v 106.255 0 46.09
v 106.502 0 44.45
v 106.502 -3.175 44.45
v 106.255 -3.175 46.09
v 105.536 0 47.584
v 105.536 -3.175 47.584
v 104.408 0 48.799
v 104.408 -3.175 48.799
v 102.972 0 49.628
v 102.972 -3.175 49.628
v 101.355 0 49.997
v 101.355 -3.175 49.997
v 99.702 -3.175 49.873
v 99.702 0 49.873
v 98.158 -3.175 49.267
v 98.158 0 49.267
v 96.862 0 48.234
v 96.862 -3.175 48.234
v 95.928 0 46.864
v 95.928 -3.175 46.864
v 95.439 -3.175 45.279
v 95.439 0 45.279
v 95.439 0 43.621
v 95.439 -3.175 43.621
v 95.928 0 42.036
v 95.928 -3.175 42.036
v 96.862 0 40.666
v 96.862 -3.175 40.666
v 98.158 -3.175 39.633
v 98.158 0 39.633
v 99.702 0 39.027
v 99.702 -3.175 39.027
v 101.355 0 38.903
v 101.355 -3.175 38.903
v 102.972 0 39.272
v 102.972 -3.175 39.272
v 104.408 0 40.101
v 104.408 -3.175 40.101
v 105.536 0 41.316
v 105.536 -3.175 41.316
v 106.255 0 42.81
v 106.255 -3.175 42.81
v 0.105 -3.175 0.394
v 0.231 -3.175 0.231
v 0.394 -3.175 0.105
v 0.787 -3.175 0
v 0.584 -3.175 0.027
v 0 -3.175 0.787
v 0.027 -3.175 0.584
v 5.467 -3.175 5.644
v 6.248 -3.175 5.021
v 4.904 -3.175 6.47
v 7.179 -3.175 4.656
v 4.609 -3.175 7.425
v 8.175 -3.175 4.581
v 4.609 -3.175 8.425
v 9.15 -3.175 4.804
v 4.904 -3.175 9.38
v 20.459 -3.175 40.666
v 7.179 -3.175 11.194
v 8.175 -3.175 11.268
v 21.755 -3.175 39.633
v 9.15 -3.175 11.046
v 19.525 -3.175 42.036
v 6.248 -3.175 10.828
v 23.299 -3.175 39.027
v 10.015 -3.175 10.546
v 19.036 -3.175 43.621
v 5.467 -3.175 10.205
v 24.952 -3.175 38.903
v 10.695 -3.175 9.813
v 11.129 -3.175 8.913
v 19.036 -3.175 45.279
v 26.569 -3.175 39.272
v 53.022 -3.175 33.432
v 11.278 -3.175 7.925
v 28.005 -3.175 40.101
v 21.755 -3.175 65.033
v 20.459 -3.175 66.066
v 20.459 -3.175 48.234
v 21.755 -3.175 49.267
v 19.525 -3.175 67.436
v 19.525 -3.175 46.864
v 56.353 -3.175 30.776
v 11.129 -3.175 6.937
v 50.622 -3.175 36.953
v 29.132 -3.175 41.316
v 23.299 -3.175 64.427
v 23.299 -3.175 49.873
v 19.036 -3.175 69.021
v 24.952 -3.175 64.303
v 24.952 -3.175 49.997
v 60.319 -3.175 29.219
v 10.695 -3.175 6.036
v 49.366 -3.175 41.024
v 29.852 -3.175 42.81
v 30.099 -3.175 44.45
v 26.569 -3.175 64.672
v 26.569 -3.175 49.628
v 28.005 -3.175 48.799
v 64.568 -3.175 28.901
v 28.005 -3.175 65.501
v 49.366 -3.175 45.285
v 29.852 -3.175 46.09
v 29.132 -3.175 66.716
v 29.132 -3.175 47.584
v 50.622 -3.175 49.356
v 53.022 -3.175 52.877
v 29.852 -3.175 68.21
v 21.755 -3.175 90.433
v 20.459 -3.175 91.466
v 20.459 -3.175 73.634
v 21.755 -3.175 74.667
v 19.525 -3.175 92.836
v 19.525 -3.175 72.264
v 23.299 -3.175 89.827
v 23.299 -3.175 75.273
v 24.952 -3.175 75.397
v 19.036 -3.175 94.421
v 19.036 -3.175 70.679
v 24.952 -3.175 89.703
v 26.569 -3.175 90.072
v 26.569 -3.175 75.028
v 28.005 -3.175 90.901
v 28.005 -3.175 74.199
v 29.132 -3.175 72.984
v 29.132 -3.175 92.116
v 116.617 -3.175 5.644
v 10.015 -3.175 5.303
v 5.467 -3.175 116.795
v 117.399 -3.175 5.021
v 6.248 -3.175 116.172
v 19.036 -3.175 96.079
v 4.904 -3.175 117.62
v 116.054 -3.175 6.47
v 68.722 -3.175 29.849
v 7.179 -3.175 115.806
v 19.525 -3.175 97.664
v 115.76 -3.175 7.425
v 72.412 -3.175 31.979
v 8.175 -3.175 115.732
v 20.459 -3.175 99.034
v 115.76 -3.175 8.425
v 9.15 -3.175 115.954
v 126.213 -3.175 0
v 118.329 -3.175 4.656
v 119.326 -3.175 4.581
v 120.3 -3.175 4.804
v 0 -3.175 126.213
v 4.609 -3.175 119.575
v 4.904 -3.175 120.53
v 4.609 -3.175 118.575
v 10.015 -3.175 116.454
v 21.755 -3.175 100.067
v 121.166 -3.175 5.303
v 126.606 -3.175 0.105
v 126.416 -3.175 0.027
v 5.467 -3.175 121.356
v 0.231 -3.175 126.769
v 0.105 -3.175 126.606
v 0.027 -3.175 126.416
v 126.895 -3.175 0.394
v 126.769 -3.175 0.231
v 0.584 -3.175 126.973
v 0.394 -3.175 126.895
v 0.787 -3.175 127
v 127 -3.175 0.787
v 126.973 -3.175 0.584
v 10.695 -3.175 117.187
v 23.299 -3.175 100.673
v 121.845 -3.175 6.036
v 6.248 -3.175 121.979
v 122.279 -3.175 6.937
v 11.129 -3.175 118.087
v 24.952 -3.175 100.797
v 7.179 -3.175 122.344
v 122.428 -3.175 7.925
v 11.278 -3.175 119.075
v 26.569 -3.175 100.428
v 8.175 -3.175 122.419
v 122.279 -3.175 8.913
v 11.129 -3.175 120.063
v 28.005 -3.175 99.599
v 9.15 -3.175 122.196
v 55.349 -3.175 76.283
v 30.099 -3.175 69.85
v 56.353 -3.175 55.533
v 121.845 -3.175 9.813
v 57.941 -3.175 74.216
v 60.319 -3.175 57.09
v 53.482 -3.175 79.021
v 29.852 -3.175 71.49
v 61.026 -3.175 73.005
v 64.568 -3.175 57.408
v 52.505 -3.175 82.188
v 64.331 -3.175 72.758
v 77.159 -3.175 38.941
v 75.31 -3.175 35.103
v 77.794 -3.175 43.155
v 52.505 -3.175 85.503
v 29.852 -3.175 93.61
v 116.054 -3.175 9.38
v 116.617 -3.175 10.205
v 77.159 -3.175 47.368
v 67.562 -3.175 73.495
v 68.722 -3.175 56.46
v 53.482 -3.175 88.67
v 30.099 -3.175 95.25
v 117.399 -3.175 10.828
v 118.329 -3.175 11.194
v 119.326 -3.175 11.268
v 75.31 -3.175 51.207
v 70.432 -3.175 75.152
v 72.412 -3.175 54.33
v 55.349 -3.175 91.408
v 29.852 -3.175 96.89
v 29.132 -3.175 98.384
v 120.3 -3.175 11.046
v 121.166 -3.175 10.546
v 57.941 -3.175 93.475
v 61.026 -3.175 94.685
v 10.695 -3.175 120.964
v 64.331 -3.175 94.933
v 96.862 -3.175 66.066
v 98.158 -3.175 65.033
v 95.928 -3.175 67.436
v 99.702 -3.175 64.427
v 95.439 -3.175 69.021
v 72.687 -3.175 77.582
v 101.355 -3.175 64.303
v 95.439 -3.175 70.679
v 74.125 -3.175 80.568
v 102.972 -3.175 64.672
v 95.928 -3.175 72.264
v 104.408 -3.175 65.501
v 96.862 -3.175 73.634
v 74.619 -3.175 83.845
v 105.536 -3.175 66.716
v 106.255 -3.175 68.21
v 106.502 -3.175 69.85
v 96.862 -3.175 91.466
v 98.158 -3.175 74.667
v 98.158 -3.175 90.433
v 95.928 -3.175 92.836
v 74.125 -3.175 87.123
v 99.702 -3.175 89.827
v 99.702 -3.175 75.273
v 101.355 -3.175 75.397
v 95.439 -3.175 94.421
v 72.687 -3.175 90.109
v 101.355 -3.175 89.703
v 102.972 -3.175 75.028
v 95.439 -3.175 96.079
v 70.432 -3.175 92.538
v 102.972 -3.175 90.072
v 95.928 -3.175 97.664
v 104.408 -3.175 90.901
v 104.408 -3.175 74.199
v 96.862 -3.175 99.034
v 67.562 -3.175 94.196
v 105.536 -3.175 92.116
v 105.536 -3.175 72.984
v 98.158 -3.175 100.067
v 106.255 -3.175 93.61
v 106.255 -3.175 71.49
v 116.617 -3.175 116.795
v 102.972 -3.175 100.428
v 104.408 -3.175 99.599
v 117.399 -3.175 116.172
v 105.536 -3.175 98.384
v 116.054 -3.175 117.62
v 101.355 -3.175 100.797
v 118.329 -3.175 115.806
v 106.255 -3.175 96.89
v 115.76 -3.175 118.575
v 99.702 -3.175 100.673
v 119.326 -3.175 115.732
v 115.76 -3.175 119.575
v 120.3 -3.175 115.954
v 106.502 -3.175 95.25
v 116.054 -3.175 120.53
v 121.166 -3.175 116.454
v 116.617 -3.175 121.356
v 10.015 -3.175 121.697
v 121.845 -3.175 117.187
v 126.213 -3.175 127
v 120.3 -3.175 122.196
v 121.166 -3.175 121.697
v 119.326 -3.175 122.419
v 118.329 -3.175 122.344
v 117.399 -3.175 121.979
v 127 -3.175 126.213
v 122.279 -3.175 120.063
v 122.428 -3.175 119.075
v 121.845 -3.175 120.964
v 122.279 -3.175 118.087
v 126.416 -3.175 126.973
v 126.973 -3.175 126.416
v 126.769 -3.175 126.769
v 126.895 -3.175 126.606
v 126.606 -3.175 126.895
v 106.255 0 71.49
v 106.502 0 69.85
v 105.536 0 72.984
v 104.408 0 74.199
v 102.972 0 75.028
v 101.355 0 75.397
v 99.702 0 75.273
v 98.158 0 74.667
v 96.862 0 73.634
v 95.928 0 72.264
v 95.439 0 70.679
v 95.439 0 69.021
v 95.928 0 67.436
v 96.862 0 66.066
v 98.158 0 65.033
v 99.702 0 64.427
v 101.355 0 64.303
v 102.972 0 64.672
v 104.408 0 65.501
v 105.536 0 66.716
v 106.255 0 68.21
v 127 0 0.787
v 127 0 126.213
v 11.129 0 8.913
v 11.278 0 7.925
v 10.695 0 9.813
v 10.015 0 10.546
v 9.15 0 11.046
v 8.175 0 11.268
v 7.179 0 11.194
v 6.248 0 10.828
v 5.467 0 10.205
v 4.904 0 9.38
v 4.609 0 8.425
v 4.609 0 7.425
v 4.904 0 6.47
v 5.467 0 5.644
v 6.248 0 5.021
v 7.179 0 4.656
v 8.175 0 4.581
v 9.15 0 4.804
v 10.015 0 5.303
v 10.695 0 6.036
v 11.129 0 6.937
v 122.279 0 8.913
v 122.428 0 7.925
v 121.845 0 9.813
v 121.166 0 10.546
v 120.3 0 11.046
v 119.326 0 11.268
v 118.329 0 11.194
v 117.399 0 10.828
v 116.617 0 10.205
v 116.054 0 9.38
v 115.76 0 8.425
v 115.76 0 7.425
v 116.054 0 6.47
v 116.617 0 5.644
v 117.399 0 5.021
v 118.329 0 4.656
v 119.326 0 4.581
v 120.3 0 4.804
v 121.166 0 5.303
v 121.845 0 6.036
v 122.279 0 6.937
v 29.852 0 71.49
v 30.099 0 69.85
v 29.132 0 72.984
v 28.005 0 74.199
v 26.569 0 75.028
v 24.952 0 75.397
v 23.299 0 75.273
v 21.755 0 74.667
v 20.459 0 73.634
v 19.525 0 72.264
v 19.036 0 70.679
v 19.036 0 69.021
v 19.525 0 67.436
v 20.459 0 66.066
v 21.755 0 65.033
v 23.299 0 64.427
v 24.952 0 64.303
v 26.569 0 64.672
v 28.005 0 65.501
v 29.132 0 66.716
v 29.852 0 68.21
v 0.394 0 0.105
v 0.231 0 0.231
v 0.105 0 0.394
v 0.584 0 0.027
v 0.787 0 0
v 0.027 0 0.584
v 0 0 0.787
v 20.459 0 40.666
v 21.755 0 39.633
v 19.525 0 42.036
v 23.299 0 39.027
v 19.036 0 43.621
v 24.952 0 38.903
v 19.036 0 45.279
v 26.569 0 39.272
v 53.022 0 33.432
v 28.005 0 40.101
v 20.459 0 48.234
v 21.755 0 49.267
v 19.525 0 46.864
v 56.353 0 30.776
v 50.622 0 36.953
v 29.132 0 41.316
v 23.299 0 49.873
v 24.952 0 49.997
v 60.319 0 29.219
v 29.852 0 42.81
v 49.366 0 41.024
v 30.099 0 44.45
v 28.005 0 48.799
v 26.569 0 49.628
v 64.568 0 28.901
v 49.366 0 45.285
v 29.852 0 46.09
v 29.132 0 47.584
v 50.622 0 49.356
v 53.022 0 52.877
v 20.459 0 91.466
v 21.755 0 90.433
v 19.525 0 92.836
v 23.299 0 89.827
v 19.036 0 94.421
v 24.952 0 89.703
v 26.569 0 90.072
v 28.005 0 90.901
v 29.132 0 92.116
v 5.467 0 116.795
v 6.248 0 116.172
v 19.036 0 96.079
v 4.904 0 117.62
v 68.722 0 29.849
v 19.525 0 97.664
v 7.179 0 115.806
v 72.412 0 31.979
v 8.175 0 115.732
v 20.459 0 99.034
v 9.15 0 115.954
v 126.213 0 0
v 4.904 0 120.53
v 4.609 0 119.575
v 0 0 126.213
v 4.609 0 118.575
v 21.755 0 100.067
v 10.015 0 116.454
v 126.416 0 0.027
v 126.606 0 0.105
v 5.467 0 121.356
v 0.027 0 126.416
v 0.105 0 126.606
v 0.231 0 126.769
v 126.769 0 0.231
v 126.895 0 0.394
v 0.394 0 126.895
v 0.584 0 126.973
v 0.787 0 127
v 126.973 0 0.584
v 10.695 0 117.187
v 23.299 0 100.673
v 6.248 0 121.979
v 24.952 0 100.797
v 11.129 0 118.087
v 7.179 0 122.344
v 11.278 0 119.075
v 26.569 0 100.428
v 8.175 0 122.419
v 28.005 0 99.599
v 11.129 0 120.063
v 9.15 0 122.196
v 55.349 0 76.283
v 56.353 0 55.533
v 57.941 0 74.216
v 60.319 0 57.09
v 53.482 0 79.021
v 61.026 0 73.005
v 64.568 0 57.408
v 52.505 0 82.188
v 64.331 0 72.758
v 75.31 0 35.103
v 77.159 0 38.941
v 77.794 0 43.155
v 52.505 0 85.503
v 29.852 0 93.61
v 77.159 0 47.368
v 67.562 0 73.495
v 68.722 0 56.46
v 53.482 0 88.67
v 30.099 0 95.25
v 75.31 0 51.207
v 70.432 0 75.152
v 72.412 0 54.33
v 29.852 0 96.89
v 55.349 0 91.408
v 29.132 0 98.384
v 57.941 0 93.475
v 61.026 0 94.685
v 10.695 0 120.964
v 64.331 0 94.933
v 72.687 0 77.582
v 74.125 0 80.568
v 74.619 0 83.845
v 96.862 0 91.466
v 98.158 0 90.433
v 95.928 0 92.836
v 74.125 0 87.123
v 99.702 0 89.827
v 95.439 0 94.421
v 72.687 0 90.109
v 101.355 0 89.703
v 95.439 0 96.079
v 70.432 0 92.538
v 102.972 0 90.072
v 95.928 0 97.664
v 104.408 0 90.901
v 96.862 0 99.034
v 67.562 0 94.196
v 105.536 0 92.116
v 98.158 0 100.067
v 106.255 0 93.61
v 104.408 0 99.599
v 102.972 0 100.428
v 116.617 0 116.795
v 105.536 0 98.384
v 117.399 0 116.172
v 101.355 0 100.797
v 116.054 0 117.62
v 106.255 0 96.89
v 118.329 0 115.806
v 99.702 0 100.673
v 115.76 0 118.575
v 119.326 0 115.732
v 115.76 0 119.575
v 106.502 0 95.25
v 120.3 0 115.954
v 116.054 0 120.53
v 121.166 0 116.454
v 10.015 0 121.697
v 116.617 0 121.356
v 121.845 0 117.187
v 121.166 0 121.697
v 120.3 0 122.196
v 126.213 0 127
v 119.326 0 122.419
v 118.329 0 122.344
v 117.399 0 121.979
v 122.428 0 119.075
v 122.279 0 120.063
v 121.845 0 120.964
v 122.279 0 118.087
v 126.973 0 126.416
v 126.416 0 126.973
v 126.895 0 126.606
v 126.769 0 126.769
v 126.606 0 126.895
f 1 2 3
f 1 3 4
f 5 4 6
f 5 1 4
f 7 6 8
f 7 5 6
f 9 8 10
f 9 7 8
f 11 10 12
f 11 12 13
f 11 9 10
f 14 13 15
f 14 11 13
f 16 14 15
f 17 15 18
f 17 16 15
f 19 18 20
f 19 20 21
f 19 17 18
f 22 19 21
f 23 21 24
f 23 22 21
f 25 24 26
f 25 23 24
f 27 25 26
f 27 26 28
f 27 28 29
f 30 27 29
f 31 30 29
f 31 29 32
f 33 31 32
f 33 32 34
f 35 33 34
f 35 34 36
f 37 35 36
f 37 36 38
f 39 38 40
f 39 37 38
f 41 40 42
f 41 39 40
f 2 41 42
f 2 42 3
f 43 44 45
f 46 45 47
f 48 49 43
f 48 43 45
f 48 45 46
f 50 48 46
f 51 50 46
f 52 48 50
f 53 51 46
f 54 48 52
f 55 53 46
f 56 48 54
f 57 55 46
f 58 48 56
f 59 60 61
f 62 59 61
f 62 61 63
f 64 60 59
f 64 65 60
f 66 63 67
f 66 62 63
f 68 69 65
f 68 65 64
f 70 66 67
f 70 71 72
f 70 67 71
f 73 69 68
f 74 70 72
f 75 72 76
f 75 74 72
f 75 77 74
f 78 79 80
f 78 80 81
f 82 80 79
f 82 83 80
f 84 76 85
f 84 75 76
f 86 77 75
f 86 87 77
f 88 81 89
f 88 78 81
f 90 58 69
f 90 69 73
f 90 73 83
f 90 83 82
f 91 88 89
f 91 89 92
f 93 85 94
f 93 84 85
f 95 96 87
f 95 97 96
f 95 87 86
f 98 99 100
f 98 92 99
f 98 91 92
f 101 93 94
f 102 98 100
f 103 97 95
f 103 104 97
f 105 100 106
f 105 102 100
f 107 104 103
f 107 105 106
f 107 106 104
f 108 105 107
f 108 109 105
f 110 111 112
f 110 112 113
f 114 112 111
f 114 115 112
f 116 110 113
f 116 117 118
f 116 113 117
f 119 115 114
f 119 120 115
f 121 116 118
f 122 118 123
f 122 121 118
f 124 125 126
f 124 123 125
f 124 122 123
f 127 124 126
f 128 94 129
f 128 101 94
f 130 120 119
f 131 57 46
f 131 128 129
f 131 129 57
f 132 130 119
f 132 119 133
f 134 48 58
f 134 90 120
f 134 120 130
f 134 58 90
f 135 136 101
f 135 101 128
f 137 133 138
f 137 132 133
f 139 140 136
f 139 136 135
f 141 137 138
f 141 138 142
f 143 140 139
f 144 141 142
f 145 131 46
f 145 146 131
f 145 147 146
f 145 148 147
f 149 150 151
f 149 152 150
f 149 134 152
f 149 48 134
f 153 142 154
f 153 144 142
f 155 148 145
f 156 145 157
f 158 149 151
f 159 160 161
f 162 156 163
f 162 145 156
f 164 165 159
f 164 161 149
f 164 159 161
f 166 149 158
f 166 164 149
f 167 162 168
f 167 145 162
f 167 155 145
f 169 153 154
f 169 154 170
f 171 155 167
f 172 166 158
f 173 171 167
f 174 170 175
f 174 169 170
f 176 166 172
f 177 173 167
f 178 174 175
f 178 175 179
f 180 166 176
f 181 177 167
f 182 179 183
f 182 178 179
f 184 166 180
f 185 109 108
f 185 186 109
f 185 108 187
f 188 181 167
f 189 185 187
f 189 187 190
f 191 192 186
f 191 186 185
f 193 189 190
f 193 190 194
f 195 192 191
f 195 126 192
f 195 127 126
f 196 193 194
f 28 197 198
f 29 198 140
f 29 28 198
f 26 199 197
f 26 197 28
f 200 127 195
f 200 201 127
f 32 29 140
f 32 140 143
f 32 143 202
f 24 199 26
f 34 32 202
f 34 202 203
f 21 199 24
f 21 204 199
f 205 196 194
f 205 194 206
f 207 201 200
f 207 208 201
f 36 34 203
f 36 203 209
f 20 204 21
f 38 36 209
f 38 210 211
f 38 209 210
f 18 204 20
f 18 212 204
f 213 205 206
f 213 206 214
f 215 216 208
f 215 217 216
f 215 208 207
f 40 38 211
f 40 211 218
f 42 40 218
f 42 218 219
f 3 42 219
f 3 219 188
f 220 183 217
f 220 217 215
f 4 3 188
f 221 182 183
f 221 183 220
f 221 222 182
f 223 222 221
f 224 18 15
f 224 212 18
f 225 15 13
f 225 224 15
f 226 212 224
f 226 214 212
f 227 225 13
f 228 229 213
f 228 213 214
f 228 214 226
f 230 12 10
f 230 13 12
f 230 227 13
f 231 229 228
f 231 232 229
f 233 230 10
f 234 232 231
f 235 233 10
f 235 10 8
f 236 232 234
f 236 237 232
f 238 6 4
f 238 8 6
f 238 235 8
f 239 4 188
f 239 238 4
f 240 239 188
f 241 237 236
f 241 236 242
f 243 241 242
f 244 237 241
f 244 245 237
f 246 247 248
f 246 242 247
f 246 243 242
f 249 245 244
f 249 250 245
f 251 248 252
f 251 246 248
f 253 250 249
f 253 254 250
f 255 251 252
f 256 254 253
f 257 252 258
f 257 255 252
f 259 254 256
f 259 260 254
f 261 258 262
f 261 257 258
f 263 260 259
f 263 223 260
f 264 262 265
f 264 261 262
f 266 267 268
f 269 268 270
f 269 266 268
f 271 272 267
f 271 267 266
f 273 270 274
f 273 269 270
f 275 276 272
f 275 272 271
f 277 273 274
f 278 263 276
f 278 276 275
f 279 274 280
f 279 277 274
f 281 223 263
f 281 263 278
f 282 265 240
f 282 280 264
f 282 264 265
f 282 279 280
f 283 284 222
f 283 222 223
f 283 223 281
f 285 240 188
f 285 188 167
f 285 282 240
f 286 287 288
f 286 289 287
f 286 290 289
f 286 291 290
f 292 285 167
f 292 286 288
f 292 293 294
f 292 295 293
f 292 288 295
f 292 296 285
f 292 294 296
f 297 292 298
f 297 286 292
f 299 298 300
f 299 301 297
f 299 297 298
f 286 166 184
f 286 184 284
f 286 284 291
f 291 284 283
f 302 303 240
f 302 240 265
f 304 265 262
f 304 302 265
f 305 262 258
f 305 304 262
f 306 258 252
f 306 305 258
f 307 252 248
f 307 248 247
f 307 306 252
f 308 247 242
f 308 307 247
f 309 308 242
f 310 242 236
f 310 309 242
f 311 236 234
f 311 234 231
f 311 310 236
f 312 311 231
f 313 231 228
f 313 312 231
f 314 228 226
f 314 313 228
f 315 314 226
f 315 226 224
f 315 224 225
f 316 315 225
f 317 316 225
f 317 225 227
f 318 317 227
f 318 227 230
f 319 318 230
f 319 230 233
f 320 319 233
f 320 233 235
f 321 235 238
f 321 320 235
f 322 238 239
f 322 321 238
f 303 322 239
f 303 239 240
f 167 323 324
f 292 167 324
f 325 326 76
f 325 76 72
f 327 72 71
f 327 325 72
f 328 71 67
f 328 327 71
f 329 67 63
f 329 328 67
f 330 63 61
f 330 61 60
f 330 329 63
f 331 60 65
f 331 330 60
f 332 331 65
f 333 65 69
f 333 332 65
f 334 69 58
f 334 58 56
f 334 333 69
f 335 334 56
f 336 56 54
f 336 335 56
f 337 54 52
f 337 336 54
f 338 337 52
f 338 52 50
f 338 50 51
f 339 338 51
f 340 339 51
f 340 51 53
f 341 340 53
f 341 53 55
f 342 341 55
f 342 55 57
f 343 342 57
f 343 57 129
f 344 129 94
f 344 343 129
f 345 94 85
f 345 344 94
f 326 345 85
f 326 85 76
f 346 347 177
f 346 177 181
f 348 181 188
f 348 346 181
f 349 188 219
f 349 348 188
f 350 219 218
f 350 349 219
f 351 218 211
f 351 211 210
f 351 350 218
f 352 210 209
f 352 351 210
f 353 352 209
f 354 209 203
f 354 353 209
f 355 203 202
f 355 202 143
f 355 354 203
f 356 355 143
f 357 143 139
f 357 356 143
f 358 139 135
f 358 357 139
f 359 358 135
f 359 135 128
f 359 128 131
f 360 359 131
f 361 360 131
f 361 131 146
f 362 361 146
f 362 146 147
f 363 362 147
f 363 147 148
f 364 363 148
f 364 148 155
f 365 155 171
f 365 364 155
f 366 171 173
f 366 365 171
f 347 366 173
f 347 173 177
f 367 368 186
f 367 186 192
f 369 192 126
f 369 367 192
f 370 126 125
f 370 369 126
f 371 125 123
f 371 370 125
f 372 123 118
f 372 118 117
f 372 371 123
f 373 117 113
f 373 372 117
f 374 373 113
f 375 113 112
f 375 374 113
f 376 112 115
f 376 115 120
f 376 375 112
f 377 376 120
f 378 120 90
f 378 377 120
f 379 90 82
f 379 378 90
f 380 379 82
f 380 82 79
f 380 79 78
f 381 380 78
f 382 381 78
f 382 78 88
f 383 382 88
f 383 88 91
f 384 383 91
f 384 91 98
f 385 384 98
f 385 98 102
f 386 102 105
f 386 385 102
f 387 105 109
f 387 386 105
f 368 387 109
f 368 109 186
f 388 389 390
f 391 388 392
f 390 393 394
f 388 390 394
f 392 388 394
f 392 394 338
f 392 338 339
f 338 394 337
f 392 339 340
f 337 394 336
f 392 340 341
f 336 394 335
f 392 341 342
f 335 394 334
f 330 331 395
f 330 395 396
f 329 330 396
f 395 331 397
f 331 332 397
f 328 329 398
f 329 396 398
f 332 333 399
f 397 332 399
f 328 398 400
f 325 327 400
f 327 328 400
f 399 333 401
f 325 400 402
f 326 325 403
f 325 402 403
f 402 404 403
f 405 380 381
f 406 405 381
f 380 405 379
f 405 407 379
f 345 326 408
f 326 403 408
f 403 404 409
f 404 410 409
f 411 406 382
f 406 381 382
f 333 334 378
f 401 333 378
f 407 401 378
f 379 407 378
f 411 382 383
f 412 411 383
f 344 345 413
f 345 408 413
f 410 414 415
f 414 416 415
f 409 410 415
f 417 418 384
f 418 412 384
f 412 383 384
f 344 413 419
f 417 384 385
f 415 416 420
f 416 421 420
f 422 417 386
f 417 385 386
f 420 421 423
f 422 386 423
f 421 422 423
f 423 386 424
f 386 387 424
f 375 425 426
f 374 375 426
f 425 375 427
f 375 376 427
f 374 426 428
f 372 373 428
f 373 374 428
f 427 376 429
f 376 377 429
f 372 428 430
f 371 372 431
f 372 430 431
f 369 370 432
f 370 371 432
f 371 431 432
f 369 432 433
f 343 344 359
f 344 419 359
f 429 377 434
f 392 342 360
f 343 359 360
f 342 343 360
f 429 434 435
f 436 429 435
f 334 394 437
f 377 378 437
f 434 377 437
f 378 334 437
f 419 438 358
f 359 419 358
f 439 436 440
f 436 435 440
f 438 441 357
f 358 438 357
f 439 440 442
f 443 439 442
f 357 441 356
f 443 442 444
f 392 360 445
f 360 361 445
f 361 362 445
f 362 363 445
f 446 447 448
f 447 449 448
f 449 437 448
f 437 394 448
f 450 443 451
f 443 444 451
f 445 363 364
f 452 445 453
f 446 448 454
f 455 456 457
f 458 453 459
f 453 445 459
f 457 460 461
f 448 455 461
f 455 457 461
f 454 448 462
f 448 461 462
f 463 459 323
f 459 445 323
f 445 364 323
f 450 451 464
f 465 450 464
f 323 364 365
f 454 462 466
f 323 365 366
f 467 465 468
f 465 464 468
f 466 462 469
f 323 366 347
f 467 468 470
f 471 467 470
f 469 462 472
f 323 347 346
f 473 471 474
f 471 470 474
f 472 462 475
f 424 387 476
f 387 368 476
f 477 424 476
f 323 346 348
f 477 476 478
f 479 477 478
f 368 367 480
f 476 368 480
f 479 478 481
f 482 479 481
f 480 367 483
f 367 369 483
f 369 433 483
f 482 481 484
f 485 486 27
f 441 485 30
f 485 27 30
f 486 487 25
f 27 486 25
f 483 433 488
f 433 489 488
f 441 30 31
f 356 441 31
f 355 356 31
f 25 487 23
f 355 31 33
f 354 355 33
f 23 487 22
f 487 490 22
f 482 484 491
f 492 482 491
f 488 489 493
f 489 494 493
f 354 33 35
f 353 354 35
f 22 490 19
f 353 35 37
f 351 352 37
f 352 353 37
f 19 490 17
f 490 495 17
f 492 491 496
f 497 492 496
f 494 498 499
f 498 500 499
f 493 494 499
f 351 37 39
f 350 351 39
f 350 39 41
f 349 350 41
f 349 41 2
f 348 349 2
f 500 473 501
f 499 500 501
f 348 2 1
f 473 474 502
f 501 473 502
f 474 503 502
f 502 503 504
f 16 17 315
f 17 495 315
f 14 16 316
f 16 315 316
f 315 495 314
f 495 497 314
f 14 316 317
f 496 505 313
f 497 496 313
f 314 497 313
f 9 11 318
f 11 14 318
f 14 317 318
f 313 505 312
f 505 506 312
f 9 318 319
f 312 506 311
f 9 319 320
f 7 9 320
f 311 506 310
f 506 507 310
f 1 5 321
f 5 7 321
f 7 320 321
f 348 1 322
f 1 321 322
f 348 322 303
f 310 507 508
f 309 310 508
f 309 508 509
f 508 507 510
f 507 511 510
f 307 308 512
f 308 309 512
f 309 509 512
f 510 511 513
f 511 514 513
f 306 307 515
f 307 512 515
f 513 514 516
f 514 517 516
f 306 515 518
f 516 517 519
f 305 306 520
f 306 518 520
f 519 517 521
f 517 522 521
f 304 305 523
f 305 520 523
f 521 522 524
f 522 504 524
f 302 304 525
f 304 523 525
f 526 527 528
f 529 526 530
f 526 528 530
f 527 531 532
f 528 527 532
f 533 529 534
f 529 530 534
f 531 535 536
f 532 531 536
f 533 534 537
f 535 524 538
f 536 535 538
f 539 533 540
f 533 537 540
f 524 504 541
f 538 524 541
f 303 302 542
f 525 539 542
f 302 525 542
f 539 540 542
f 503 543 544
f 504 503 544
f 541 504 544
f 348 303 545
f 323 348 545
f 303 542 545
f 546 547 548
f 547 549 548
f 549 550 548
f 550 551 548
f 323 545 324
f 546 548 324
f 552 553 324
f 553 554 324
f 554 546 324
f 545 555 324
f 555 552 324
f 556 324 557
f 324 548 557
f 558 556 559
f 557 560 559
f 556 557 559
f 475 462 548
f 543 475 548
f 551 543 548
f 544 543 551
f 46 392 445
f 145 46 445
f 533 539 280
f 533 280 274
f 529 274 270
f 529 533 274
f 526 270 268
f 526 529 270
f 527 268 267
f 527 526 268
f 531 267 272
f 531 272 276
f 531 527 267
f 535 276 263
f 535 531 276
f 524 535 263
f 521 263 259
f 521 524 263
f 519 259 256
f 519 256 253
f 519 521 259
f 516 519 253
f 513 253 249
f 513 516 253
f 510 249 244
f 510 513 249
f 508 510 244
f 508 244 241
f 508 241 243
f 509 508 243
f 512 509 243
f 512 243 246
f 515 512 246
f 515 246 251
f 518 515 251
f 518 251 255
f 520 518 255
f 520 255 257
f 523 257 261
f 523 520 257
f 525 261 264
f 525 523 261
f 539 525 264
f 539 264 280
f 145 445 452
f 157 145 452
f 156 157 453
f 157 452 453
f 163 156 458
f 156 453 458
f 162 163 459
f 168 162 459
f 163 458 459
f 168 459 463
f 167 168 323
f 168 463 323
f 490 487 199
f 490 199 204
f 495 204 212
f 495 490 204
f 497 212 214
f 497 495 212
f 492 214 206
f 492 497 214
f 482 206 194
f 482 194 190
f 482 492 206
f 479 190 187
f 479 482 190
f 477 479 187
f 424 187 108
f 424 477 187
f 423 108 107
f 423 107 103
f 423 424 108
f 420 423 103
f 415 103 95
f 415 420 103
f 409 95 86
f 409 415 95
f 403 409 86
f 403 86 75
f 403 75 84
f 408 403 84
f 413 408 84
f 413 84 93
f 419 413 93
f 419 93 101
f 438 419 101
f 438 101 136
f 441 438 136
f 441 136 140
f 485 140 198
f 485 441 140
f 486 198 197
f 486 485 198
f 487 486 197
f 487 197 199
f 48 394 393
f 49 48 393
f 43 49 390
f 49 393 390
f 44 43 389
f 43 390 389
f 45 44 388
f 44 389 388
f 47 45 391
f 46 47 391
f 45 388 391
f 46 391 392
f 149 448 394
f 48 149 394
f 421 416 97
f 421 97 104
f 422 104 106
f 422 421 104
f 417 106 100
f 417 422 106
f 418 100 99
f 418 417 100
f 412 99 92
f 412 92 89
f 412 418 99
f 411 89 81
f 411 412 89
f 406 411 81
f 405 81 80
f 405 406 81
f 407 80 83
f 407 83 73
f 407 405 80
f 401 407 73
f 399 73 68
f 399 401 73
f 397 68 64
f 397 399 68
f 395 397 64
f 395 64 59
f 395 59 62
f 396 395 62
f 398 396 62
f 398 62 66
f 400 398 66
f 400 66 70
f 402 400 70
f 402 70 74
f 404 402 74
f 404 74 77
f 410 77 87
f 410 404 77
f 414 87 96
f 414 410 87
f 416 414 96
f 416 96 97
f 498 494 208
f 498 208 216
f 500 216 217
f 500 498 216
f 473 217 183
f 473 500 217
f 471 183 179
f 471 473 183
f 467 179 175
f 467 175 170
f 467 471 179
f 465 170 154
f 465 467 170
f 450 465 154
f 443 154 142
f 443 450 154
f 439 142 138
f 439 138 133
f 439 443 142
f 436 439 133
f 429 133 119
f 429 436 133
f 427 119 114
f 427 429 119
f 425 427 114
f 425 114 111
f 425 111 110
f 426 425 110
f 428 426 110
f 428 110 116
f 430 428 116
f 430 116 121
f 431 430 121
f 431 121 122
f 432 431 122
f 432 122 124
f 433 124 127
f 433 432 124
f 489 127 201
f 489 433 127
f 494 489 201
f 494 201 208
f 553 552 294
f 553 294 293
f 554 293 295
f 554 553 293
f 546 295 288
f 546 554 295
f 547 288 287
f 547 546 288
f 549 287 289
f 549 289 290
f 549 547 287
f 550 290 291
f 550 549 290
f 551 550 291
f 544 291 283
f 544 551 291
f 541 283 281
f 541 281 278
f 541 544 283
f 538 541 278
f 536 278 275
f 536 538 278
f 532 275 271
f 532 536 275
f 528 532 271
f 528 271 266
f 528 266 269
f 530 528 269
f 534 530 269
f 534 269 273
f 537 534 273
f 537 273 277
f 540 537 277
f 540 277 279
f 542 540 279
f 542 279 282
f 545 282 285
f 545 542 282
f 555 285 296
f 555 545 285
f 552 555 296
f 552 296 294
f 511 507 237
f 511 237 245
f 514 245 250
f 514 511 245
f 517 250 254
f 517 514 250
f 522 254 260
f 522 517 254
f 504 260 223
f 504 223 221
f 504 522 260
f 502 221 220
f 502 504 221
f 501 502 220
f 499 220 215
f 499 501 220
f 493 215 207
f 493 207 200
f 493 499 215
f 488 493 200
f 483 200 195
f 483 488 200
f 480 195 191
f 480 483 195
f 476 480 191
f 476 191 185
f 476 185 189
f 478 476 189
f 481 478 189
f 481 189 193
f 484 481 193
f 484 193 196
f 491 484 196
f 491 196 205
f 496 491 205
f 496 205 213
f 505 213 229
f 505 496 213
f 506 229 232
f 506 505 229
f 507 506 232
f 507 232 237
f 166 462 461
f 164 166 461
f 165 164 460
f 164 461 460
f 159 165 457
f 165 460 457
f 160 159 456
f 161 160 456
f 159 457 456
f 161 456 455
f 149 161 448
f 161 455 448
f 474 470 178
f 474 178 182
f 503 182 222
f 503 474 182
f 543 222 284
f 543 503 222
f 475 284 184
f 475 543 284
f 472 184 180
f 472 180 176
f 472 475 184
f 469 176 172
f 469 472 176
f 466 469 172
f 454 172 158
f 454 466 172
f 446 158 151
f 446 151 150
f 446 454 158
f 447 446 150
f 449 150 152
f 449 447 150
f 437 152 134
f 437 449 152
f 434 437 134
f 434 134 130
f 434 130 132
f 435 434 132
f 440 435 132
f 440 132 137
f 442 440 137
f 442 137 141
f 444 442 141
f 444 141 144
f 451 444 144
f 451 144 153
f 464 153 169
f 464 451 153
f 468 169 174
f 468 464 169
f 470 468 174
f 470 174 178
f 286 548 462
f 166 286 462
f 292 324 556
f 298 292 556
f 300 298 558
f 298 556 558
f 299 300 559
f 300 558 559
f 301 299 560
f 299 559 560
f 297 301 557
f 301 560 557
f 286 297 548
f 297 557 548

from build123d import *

# Parameters (mm, degrees)
F0_R     = 3.3528
F0_R_2   = 5.5626
F0_R_3   = 14.29385
F0_R_4   = 11.11885
F1_DEPTH = 3.175


with BuildPart() as f1:
    # F0 (on Front) → F1 (new body)
    with BuildSketch(Plane.XZ):
        with BuildLine():
            ThreePointArc((0, 0.7874), (0.230624, 0.230624), (0.7874, 0))
            Line((0.7874, 0), (126.2126, 0))
            ThreePointArc((126.2126, 0), (126.769376, 0.230624), (127, 0.7874))
            Line((127, 0.7874), (127, 126.2126))
            ThreePointArc((127, 126.2126), (126.769376, 126.769376), (126.2126, 127))
            Line((126.2126, 127), (0.7874, 127))
            ThreePointArc((0.7874, 127), (0.230624, 126.769376), (0, 126.2126))
            Line((0, 126.2126), (0, 0.7874))
        make_face()
        with Locations((7.9248, 7.9248)):
            Circle(F0_R, mode=Mode.SUBTRACT)
        with Locations((24.5364, 44.45)):
            Circle(F0_R_2, mode=Mode.SUBTRACT)
        with Locations((119.0752, 7.9248)):
            Circle(F0_R, mode=Mode.SUBTRACT)
        with Locations((63.5, 43.1546)):
            Circle(F0_R_3, mode=Mode.SUBTRACT)
        with Locations((100.9396, 44.45)):
            Circle(F0_R_2, mode=Mode.SUBTRACT)
        with Locations((24.5364, 69.85)):
            Circle(F0_R_2, mode=Mode.SUBTRACT)
        with Locations((24.5364, 95.25)):
            Circle(F0_R_2, mode=Mode.SUBTRACT)
        with Locations((7.9248, 119.0752)):
            Circle(F0_R, mode=Mode.SUBTRACT)
        with Locations((63.5, 83.8454)):
            Circle(F0_R_4, mode=Mode.SUBTRACT)
        with Locations((100.9396, 69.85)):
            Circle(F0_R_2, mode=Mode.SUBTRACT)
        with Locations((100.9396, 95.25)):
            Circle(F0_R_2, mode=Mode.SUBTRACT)
        with Locations((119.0752, 119.0752)):
            Circle(F0_R, mode=Mode.SUBTRACT)
    extrude(amount=F1_DEPTH)


solid = f1.part
